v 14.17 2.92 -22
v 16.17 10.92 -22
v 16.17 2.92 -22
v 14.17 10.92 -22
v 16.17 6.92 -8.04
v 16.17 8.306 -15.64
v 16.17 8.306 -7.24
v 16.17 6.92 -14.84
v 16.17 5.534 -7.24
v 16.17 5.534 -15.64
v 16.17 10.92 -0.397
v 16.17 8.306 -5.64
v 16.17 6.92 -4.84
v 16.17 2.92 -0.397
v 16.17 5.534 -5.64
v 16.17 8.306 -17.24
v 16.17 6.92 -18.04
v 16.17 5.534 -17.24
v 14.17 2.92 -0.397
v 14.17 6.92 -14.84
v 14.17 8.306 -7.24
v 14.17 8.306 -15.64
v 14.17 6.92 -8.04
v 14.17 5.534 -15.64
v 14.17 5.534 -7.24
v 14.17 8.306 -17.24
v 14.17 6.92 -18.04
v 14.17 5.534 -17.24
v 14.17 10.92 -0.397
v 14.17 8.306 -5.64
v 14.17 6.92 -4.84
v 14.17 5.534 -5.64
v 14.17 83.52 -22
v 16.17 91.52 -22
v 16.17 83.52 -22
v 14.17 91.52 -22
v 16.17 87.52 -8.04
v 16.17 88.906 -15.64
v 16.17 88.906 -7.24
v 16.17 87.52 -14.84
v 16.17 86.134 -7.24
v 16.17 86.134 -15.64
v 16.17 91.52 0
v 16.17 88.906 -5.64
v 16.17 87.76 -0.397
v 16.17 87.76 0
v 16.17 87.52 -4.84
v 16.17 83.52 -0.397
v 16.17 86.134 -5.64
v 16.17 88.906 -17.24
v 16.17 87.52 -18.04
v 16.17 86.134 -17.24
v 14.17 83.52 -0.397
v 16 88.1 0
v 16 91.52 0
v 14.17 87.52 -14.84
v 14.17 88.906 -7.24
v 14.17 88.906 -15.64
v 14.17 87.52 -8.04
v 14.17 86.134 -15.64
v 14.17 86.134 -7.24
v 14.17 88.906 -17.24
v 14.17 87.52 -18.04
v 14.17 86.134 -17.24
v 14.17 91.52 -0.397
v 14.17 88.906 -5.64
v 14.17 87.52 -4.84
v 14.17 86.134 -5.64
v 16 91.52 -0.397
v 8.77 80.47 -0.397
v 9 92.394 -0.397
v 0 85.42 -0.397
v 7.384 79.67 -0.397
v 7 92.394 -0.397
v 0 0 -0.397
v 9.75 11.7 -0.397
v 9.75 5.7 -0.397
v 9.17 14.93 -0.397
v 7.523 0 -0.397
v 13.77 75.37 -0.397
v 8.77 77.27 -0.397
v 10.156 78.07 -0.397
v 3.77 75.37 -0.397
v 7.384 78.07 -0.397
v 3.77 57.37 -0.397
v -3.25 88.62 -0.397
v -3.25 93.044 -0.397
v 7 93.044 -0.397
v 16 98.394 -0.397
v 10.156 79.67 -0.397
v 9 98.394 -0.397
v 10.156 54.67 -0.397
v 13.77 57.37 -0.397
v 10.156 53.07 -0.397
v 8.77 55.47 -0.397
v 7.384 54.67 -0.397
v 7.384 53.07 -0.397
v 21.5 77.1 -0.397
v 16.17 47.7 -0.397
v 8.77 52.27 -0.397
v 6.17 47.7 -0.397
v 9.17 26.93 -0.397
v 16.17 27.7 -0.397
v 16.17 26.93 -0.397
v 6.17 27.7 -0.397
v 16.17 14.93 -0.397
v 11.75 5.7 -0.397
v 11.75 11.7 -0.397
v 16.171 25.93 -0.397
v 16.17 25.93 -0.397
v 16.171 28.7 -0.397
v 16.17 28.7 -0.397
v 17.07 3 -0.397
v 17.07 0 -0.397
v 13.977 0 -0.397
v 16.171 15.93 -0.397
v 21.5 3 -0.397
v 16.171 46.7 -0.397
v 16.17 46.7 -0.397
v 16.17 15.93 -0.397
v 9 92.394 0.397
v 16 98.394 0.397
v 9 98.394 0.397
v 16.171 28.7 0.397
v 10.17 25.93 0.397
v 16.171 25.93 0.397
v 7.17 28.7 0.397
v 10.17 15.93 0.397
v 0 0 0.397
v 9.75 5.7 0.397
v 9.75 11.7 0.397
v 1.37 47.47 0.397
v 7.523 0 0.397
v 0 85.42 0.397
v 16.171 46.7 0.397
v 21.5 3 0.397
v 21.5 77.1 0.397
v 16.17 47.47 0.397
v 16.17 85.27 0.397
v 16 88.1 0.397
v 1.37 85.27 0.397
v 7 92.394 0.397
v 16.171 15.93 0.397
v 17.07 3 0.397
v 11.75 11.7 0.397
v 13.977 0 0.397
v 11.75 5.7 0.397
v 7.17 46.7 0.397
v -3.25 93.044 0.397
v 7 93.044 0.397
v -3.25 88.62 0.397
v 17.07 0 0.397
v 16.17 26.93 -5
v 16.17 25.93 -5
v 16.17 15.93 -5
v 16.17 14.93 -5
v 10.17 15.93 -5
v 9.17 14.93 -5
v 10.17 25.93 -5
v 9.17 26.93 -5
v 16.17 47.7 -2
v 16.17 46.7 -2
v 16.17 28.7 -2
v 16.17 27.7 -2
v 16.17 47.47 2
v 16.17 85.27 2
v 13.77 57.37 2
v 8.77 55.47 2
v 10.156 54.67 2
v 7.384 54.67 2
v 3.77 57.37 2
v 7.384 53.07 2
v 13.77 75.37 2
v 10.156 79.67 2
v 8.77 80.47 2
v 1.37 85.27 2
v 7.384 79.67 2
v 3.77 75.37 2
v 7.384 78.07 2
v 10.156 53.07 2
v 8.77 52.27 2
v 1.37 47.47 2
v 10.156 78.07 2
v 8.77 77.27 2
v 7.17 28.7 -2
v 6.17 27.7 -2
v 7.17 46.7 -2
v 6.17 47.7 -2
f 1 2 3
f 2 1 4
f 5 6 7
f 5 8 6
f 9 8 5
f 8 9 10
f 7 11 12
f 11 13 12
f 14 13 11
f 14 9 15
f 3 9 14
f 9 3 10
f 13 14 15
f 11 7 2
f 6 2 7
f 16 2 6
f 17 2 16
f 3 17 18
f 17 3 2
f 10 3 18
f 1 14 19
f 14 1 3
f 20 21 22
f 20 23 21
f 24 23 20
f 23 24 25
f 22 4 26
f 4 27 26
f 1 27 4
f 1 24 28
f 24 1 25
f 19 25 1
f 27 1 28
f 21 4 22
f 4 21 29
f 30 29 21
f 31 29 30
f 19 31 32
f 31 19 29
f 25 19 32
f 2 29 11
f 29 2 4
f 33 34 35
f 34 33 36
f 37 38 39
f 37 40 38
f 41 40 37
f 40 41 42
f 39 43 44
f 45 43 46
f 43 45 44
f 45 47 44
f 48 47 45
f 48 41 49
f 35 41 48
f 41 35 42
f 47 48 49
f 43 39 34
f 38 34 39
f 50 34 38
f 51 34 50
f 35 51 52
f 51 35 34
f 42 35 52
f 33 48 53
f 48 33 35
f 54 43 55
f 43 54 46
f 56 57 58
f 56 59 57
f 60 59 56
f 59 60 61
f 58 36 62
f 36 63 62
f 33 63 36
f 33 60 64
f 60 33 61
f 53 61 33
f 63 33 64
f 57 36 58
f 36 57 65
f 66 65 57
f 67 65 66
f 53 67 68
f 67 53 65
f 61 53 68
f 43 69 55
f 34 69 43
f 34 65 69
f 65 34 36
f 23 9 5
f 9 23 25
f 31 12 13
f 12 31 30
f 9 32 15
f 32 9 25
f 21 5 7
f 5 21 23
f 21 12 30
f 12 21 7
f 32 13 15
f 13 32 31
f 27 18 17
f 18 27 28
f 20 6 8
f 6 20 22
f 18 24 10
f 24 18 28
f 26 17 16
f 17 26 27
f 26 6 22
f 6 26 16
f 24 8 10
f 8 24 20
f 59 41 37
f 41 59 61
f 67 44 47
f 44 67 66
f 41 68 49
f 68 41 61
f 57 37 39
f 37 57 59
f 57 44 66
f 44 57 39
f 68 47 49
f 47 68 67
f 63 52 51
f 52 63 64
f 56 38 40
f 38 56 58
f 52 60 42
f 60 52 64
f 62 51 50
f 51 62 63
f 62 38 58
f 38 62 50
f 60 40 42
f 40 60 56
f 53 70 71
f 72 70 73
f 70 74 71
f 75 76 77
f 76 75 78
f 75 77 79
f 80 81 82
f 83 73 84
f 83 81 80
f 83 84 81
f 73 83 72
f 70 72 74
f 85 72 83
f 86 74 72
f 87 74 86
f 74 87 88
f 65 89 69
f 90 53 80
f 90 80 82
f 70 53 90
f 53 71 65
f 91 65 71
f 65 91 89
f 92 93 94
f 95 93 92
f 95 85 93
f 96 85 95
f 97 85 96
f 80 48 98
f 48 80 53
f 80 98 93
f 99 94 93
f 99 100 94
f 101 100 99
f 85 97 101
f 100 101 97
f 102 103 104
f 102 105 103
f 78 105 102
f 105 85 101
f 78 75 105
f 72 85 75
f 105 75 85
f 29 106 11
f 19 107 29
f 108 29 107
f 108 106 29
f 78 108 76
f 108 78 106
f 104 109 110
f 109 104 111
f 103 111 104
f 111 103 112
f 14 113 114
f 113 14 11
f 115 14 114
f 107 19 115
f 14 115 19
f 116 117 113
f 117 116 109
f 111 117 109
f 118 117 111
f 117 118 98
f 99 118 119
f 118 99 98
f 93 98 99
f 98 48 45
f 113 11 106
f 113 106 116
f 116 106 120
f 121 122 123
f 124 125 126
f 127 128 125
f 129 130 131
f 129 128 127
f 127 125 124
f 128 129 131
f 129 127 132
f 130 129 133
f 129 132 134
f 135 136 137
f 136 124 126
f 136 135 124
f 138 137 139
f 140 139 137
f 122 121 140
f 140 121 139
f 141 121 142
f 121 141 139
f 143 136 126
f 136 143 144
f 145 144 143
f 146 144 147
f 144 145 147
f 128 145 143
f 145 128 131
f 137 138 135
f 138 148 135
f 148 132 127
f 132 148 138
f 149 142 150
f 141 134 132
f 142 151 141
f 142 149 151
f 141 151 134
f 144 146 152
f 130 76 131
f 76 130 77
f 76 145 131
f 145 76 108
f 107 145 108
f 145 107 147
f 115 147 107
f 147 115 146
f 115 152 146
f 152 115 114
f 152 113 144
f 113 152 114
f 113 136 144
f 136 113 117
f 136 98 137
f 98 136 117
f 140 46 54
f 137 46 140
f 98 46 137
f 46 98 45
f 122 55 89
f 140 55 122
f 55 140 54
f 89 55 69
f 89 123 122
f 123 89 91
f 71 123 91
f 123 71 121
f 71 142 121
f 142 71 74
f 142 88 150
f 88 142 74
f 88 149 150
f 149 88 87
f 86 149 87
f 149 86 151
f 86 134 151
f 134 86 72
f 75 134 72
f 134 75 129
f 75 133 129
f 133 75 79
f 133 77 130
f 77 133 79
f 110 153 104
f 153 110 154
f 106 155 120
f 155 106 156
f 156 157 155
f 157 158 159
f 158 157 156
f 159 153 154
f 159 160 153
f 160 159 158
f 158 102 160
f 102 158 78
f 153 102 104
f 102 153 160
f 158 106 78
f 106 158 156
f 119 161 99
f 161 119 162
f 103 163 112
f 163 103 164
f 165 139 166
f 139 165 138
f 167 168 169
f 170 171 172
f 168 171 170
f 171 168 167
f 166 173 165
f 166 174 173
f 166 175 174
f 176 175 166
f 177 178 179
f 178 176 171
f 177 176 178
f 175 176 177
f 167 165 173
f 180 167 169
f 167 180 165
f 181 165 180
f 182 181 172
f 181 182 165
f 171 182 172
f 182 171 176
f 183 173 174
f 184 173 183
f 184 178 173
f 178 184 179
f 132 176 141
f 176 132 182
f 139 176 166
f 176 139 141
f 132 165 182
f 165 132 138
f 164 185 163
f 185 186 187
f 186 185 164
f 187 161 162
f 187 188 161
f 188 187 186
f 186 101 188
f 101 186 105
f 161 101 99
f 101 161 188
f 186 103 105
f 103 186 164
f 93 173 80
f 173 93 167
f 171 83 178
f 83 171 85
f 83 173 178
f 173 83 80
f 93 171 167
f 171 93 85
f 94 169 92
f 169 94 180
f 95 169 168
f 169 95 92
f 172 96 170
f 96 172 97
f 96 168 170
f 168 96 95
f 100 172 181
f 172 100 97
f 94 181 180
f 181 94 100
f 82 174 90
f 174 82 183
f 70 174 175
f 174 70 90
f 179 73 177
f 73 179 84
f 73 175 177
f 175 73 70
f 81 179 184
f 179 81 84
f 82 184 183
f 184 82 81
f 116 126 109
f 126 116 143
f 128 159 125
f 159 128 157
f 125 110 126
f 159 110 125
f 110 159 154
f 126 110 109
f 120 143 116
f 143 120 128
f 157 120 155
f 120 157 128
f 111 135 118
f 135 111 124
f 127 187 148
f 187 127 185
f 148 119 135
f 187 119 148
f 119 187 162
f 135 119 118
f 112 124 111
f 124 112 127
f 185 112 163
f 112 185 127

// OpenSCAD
THICKNESS_MAX=2.44;
THICKNESS=2.4;

ORIGINAL_THICKNESS=25.4/32;

NUBUS_HEIGHT_BELOW_OUTER_LIP=92; // NuBus p57, max is 97.25
NUBUS_HEIGHT_ABOVE_OUTER_LIP=6; // NuBus p57

NUBUS_BETWEEN_NOTCHES=87.25; // DCDMF3 p625 & p635, bottom of low to top of high?
NUBUS_HIGH_NOTCH_TO_TOP=10.35;// DCDMF3 p635, top of high to bottom of inner lip ?

NUBUS_BASE_WIDTH=18.57;
NUBUS_EXTRA_WIDTH=2.93;
NUBUS_FULL_WIDTH=NUBUS_BASE_WIDTH+NUBUS_EXTRA_WIDTH;
NUBUS_TOP_WIDTH=21.82;
NUBUS_OVERHANG_WIDTH=NUBUS_TOP_WIDTH-NUBUS_BASE_WIDTH;
NUBUS_EXTRA_FROM_TOP=20.5;
NUBUS_ANGLE_SECTION_LACK_OF_WIDTH=2.57;
NUBUS_ANGLE_SECTION_WIDTH_REDUCTION=NUBUS_EXTRA_WIDTH+NUBUS_ANGLE_SECTION_LACK_OF_WIDTH;

NUBUS_HEIGHT_NARROW_BOTTOM_TO_TOP=94.6;
NUBUS_FULL_HEIGHT=(NUBUS_BETWEEN_NOTCHES+NUBUS_HIGH_NOTCH_TO_TOP);
NUBUS_NARROW_BOTTOM_HEIGHT=NUBUS_FULL_HEIGHT-NUBUS_HEIGHT_NARROW_BOTTOM_TO_TOP;

NUBUS_EXTRA_NARROW_BOTTOM=1.5;

NUBUS_OVERHANG_MIN_HEIGHT=8.4;
NUBUS_OVERHANG_MAX_HEIGHT=12.18;
NUBUS_OVERHANG_RADIUS=3.2;
NUBUS_TOP_BIT_WIDTH=9.57-2.57;

FRONT_NOTCH_FROM_TOP=85.9;
FRONT_NOTCH_STRAIGHT_WIDTH=2;
FRONT_NOTCH_STRAIGHT_HEIGHT=6;
FRONT_NOTCH_ANGLE_HEIGHT=(NUBUS_BETWEEN_NOTCHES+NUBUS_HIGH_NOTCH_TO_TOP)-(FRONT_NOTCH_FROM_TOP+FRONT_NOTCH_STRAIGHT_HEIGHT);
FRONT_NOTCH_ANGLE_WIDTH=FRONT_NOTCH_ANGLE_HEIGHT*sin(23);

points=[[0,0],
        [NUBUS_BASE_WIDTH-7.82-FRONT_NOTCH_STRAIGHT_WIDTH/2-FRONT_NOTCH_ANGLE_WIDTH,0],
        [NUBUS_BASE_WIDTH-7.82-FRONT_NOTCH_STRAIGHT_WIDTH/2,FRONT_NOTCH_ANGLE_HEIGHT],
        [NUBUS_BASE_WIDTH-7.82-FRONT_NOTCH_STRAIGHT_WIDTH/2,FRONT_NOTCH_ANGLE_HEIGHT+FRONT_NOTCH_STRAIGHT_HEIGHT],
        [NUBUS_BASE_WIDTH-7.82+FRONT_NOTCH_STRAIGHT_WIDTH/2,FRONT_NOTCH_ANGLE_HEIGHT+FRONT_NOTCH_STRAIGHT_HEIGHT],
        [NUBUS_BASE_WIDTH-7.82+FRONT_NOTCH_STRAIGHT_WIDTH/2,FRONT_NOTCH_ANGLE_HEIGHT],
        [NUBUS_BASE_WIDTH-7.82+FRONT_NOTCH_STRAIGHT_WIDTH/2+FRONT_NOTCH_ANGLE_WIDTH,0],
        [NUBUS_BASE_WIDTH-NUBUS_EXTRA_NARROW_BOTTOM,0],
        
        [NUBUS_BASE_WIDTH-NUBUS_EXTRA_NARROW_BOTTOM,NUBUS_NARROW_BOTTOM_HEIGHT],
        [NUBUS_FULL_WIDTH,NUBUS_NARROW_BOTTOM_HEIGHT],
        [NUBUS_FULL_WIDTH,NUBUS_FULL_HEIGHT-NUBUS_EXTRA_FROM_TOP],
        [NUBUS_FULL_WIDTH-NUBUS_ANGLE_SECTION_WIDTH_REDUCTION,(NUBUS_FULL_HEIGHT-NUBUS_EXTRA_FROM_TOP)+(NUBUS_ANGLE_SECTION_WIDTH_REDUCTION*2)],
        [NUBUS_FULL_WIDTH-NUBUS_ANGLE_SECTION_WIDTH_REDUCTION,NUBUS_FULL_HEIGHT+ORIGINAL_THICKNESS],
        [NUBUS_FULL_WIDTH-NUBUS_ANGLE_SECTION_WIDTH_REDUCTION-NUBUS_TOP_BIT_WIDTH,NUBUS_FULL_HEIGHT+ORIGINAL_THICKNESS],
        [NUBUS_FULL_WIDTH-NUBUS_ANGLE_SECTION_WIDTH_REDUCTION-NUBUS_TOP_BIT_WIDTH,NUBUS_FULL_HEIGHT+ORIGINAL_THICKNESS-6], //6: measurement
        [NUBUS_FULL_WIDTH-NUBUS_ANGLE_SECTION_WIDTH_REDUCTION-NUBUS_TOP_BIT_WIDTH-2,NUBUS_FULL_HEIGHT+ORIGINAL_THICKNESS-6], //2&6: measurement
        [NUBUS_FULL_WIDTH-NUBUS_ANGLE_SECTION_WIDTH_REDUCTION-NUBUS_TOP_BIT_WIDTH-2,NUBUS_FULL_HEIGHT+ORIGINAL_THICKNESS-NUBUS_HIGH_NOTCH_TO_TOP+5], // 5 is the diustance between top notch and top screw hole
        [-NUBUS_OVERHANG_WIDTH,NUBUS_FULL_HEIGHT+ORIGINAL_THICKNESS-NUBUS_HIGH_NOTCH_TO_TOP+5],
        [-NUBUS_OVERHANG_WIDTH,NUBUS_FULL_HEIGHT-NUBUS_OVERHANG_MAX_HEIGHT+NUBUS_OVERHANG_RADIUS],
        [0,NUBUS_FULL_HEIGHT-NUBUS_OVERHANG_MAX_HEIGHT]        
];

module backplate() {
linear_extrude(height = ORIGINAL_THICKNESS, center = true) { polygon(points); };
}

// PCB, don't print
PCB_THICKNESS=1.6;
PCB_OFFSET=(NUBUS_FULL_WIDTH-2.93)-PCB_THICKNESS/2;
module pcb() {
    color("green") translate([PCB_OFFSET,0,-50]) linear_extrude(height = 100, center = true) { polygon ([[-PCB_THICKNESS,-5.08],[0,-5.08],[0,91.52],[-PCB_THICKNESS,91.52]]); };
}

// NuBusFPGA
BOTTOM_HOLE_Y=8-1.08;
TOP_HOLE_Y=87.52;
FIRST_HOLE_X=-6.44;
SECOND_HOLE_X=-16.44;

module holders() {
difference() {
union() {
color("red") translate([0,0,-11]) linear_extrude(height = 22, center = true) { polygon([
    [PCB_OFFSET-PCB_THICKNESS,BOTTOM_HOLE_Y-4],
    [PCB_OFFSET-PCB_THICKNESS,BOTTOM_HOLE_Y+4],
    [PCB_OFFSET-PCB_THICKNESS-2,BOTTOM_HOLE_Y+4],
    [PCB_OFFSET-PCB_THICKNESS-2,BOTTOM_HOLE_Y-4],
    ]); };
color("red") translate([0,0,-11]) linear_extrude(height = 22, center = true) { polygon([
    [PCB_OFFSET-PCB_THICKNESS,TOP_HOLE_Y-4],
    [PCB_OFFSET-PCB_THICKNESS,TOP_HOLE_Y+4],
    [PCB_OFFSET-PCB_THICKNESS-2,TOP_HOLE_Y+4],
    [PCB_OFFSET-PCB_THICKNESS-2,TOP_HOLE_Y-4],
    ]); };
}
union() { 
color("blue") translate([0,BOTTOM_HOLE_Y,FIRST_HOLE_X]) rotate([0,90,0]) cylinder(r1=1.6,r2=1.6,h=20);
color("blue") translate([0,BOTTOM_HOLE_Y,SECOND_HOLE_X]) rotate([0,90,0]) cylinder(r1=1.6,r2=1.6,h=20);
color("blue") translate([0,TOP_HOLE_Y,FIRST_HOLE_X]) rotate([0,90,0]) cylinder(r1=1.6,r2=1.6,h=20);
color("blue") translate([0,TOP_HOLE_Y,SECOND_HOLE_X]) rotate([0,90,0]) cylinder(r1=1.6,r2=1.6,h=20);
}
}
}


//cube ([16.5+4, 12, 9.5+4 /* 14.8 max */], center = true);
USB_HOLDER_HEIGHT=5;
USB_HOLDER_WIDTH=10;
USB_HOLDER_DEPTH=5;
module usb_pos() {
translate([-1-USB_HOLDER_HEIGHT/2+PCB_OFFSET-PCB_THICKNESS,100-(74.67+(83.47-74.67)/2),-USB_HOLDER_DEPTH/2]) cube([2+USB_HOLDER_HEIGHT,2+USB_HOLDER_WIDTH,USB_HOLDER_DEPTH], center = true);
}
module usb_neg() {
translate([-0.499-USB_HOLDER_HEIGHT/2+PCB_OFFSET-PCB_THICKNESS,100-(74.67+(83.47-74.67)/2),-USB_HOLDER_DEPTH/2]) cube([1.001+USB_HOLDER_HEIGHT,USB_HOLDER_WIDTH,USB_HOLDER_DEPTH*4], center = true);
}

VGA_HOLDER_HEIGHT=14.8;
VGA_HOLDER_WIDTH=31.8;
VGA_HOLDER_DEPTH=2;
module vga_pos() {
    translate([-VGA_HOLDER_HEIGHT/2+PCB_OFFSET-PCB_THICKNESS,100-(18.21+(49.05-18.21)/2),-VGA_HOLDER_DEPTH/2+VGA_HOLDER_DEPTH]) cube ([VGA_HOLDER_HEIGHT, 6+VGA_HOLDER_WIDTH, VGA_HOLDER_DEPTH], center = true);
}
module vga_neg() {
    translate([-VGA_HOLDER_HEIGHT/2+PCB_OFFSET-PCB_THICKNESS,100-(18.21+(49.05-18.21)/2),-VGA_HOLDER_DEPTH/2]) cube ([10, 18, 10+0.001], center = true);
    
    
    translate([-VGA_HOLDER_HEIGHT/2+PCB_OFFSET-PCB_THICKNESS,100-(18.21+(49.05-18.21)/2)-12.5,-VGA_HOLDER_DEPTH/2]) color("black") rotate([0,0,90]) cylinder (h = 10, r1 = 1.6, r2 = 1.6, center = true);
    translate([-VGA_HOLDER_HEIGHT/2+PCB_OFFSET-PCB_THICKNESS,100-(18.21+(49.05-18.21)/2)+12.5,-VGA_HOLDER_DEPTH/2]) color("black") rotate([0,0,90]) cylinder (h = 10, r1 = 1.6, r2 = 1.6, center = true);
}

HDMI_HOLDER_HEIGHT=8;
HDMI_HOLDER_WIDTH=18;
HDMI_HOLDER_DEPTH=2;
module hdmi_pos() {
    translate([-1-HDMI_HOLDER_HEIGHT/2+PCB_OFFSET-PCB_THICKNESS,100-(53.3+(71.3-53.3)/2),-HDMI_HOLDER_DEPTH/2]) cube ([2+HDMI_HOLDER_HEIGHT, 2+HDMI_HOLDER_WIDTH, HDMI_HOLDER_DEPTH], center = true);
}
module hdmi_neg() {
    translate([-0.499-HDMI_HOLDER_HEIGHT/2+PCB_OFFSET-PCB_THICKNESS,100-(53.3+(71.3-53.3)/2),-HDMI_HOLDER_DEPTH/2]) cube ([1.001+HDMI_HOLDER_HEIGHT, HDMI_HOLDER_WIDTH, 5+0.001], center = true);
}

//pcb();

module complete() {
    difference() {
        union() {
            backplate();
            holders();
            usb_pos();
            vga_pos();
            hdmi_pos();
        }
        union() {
            usb_neg();
            vga_neg();
            hdmi_neg();
        }
    }
}

complete();
